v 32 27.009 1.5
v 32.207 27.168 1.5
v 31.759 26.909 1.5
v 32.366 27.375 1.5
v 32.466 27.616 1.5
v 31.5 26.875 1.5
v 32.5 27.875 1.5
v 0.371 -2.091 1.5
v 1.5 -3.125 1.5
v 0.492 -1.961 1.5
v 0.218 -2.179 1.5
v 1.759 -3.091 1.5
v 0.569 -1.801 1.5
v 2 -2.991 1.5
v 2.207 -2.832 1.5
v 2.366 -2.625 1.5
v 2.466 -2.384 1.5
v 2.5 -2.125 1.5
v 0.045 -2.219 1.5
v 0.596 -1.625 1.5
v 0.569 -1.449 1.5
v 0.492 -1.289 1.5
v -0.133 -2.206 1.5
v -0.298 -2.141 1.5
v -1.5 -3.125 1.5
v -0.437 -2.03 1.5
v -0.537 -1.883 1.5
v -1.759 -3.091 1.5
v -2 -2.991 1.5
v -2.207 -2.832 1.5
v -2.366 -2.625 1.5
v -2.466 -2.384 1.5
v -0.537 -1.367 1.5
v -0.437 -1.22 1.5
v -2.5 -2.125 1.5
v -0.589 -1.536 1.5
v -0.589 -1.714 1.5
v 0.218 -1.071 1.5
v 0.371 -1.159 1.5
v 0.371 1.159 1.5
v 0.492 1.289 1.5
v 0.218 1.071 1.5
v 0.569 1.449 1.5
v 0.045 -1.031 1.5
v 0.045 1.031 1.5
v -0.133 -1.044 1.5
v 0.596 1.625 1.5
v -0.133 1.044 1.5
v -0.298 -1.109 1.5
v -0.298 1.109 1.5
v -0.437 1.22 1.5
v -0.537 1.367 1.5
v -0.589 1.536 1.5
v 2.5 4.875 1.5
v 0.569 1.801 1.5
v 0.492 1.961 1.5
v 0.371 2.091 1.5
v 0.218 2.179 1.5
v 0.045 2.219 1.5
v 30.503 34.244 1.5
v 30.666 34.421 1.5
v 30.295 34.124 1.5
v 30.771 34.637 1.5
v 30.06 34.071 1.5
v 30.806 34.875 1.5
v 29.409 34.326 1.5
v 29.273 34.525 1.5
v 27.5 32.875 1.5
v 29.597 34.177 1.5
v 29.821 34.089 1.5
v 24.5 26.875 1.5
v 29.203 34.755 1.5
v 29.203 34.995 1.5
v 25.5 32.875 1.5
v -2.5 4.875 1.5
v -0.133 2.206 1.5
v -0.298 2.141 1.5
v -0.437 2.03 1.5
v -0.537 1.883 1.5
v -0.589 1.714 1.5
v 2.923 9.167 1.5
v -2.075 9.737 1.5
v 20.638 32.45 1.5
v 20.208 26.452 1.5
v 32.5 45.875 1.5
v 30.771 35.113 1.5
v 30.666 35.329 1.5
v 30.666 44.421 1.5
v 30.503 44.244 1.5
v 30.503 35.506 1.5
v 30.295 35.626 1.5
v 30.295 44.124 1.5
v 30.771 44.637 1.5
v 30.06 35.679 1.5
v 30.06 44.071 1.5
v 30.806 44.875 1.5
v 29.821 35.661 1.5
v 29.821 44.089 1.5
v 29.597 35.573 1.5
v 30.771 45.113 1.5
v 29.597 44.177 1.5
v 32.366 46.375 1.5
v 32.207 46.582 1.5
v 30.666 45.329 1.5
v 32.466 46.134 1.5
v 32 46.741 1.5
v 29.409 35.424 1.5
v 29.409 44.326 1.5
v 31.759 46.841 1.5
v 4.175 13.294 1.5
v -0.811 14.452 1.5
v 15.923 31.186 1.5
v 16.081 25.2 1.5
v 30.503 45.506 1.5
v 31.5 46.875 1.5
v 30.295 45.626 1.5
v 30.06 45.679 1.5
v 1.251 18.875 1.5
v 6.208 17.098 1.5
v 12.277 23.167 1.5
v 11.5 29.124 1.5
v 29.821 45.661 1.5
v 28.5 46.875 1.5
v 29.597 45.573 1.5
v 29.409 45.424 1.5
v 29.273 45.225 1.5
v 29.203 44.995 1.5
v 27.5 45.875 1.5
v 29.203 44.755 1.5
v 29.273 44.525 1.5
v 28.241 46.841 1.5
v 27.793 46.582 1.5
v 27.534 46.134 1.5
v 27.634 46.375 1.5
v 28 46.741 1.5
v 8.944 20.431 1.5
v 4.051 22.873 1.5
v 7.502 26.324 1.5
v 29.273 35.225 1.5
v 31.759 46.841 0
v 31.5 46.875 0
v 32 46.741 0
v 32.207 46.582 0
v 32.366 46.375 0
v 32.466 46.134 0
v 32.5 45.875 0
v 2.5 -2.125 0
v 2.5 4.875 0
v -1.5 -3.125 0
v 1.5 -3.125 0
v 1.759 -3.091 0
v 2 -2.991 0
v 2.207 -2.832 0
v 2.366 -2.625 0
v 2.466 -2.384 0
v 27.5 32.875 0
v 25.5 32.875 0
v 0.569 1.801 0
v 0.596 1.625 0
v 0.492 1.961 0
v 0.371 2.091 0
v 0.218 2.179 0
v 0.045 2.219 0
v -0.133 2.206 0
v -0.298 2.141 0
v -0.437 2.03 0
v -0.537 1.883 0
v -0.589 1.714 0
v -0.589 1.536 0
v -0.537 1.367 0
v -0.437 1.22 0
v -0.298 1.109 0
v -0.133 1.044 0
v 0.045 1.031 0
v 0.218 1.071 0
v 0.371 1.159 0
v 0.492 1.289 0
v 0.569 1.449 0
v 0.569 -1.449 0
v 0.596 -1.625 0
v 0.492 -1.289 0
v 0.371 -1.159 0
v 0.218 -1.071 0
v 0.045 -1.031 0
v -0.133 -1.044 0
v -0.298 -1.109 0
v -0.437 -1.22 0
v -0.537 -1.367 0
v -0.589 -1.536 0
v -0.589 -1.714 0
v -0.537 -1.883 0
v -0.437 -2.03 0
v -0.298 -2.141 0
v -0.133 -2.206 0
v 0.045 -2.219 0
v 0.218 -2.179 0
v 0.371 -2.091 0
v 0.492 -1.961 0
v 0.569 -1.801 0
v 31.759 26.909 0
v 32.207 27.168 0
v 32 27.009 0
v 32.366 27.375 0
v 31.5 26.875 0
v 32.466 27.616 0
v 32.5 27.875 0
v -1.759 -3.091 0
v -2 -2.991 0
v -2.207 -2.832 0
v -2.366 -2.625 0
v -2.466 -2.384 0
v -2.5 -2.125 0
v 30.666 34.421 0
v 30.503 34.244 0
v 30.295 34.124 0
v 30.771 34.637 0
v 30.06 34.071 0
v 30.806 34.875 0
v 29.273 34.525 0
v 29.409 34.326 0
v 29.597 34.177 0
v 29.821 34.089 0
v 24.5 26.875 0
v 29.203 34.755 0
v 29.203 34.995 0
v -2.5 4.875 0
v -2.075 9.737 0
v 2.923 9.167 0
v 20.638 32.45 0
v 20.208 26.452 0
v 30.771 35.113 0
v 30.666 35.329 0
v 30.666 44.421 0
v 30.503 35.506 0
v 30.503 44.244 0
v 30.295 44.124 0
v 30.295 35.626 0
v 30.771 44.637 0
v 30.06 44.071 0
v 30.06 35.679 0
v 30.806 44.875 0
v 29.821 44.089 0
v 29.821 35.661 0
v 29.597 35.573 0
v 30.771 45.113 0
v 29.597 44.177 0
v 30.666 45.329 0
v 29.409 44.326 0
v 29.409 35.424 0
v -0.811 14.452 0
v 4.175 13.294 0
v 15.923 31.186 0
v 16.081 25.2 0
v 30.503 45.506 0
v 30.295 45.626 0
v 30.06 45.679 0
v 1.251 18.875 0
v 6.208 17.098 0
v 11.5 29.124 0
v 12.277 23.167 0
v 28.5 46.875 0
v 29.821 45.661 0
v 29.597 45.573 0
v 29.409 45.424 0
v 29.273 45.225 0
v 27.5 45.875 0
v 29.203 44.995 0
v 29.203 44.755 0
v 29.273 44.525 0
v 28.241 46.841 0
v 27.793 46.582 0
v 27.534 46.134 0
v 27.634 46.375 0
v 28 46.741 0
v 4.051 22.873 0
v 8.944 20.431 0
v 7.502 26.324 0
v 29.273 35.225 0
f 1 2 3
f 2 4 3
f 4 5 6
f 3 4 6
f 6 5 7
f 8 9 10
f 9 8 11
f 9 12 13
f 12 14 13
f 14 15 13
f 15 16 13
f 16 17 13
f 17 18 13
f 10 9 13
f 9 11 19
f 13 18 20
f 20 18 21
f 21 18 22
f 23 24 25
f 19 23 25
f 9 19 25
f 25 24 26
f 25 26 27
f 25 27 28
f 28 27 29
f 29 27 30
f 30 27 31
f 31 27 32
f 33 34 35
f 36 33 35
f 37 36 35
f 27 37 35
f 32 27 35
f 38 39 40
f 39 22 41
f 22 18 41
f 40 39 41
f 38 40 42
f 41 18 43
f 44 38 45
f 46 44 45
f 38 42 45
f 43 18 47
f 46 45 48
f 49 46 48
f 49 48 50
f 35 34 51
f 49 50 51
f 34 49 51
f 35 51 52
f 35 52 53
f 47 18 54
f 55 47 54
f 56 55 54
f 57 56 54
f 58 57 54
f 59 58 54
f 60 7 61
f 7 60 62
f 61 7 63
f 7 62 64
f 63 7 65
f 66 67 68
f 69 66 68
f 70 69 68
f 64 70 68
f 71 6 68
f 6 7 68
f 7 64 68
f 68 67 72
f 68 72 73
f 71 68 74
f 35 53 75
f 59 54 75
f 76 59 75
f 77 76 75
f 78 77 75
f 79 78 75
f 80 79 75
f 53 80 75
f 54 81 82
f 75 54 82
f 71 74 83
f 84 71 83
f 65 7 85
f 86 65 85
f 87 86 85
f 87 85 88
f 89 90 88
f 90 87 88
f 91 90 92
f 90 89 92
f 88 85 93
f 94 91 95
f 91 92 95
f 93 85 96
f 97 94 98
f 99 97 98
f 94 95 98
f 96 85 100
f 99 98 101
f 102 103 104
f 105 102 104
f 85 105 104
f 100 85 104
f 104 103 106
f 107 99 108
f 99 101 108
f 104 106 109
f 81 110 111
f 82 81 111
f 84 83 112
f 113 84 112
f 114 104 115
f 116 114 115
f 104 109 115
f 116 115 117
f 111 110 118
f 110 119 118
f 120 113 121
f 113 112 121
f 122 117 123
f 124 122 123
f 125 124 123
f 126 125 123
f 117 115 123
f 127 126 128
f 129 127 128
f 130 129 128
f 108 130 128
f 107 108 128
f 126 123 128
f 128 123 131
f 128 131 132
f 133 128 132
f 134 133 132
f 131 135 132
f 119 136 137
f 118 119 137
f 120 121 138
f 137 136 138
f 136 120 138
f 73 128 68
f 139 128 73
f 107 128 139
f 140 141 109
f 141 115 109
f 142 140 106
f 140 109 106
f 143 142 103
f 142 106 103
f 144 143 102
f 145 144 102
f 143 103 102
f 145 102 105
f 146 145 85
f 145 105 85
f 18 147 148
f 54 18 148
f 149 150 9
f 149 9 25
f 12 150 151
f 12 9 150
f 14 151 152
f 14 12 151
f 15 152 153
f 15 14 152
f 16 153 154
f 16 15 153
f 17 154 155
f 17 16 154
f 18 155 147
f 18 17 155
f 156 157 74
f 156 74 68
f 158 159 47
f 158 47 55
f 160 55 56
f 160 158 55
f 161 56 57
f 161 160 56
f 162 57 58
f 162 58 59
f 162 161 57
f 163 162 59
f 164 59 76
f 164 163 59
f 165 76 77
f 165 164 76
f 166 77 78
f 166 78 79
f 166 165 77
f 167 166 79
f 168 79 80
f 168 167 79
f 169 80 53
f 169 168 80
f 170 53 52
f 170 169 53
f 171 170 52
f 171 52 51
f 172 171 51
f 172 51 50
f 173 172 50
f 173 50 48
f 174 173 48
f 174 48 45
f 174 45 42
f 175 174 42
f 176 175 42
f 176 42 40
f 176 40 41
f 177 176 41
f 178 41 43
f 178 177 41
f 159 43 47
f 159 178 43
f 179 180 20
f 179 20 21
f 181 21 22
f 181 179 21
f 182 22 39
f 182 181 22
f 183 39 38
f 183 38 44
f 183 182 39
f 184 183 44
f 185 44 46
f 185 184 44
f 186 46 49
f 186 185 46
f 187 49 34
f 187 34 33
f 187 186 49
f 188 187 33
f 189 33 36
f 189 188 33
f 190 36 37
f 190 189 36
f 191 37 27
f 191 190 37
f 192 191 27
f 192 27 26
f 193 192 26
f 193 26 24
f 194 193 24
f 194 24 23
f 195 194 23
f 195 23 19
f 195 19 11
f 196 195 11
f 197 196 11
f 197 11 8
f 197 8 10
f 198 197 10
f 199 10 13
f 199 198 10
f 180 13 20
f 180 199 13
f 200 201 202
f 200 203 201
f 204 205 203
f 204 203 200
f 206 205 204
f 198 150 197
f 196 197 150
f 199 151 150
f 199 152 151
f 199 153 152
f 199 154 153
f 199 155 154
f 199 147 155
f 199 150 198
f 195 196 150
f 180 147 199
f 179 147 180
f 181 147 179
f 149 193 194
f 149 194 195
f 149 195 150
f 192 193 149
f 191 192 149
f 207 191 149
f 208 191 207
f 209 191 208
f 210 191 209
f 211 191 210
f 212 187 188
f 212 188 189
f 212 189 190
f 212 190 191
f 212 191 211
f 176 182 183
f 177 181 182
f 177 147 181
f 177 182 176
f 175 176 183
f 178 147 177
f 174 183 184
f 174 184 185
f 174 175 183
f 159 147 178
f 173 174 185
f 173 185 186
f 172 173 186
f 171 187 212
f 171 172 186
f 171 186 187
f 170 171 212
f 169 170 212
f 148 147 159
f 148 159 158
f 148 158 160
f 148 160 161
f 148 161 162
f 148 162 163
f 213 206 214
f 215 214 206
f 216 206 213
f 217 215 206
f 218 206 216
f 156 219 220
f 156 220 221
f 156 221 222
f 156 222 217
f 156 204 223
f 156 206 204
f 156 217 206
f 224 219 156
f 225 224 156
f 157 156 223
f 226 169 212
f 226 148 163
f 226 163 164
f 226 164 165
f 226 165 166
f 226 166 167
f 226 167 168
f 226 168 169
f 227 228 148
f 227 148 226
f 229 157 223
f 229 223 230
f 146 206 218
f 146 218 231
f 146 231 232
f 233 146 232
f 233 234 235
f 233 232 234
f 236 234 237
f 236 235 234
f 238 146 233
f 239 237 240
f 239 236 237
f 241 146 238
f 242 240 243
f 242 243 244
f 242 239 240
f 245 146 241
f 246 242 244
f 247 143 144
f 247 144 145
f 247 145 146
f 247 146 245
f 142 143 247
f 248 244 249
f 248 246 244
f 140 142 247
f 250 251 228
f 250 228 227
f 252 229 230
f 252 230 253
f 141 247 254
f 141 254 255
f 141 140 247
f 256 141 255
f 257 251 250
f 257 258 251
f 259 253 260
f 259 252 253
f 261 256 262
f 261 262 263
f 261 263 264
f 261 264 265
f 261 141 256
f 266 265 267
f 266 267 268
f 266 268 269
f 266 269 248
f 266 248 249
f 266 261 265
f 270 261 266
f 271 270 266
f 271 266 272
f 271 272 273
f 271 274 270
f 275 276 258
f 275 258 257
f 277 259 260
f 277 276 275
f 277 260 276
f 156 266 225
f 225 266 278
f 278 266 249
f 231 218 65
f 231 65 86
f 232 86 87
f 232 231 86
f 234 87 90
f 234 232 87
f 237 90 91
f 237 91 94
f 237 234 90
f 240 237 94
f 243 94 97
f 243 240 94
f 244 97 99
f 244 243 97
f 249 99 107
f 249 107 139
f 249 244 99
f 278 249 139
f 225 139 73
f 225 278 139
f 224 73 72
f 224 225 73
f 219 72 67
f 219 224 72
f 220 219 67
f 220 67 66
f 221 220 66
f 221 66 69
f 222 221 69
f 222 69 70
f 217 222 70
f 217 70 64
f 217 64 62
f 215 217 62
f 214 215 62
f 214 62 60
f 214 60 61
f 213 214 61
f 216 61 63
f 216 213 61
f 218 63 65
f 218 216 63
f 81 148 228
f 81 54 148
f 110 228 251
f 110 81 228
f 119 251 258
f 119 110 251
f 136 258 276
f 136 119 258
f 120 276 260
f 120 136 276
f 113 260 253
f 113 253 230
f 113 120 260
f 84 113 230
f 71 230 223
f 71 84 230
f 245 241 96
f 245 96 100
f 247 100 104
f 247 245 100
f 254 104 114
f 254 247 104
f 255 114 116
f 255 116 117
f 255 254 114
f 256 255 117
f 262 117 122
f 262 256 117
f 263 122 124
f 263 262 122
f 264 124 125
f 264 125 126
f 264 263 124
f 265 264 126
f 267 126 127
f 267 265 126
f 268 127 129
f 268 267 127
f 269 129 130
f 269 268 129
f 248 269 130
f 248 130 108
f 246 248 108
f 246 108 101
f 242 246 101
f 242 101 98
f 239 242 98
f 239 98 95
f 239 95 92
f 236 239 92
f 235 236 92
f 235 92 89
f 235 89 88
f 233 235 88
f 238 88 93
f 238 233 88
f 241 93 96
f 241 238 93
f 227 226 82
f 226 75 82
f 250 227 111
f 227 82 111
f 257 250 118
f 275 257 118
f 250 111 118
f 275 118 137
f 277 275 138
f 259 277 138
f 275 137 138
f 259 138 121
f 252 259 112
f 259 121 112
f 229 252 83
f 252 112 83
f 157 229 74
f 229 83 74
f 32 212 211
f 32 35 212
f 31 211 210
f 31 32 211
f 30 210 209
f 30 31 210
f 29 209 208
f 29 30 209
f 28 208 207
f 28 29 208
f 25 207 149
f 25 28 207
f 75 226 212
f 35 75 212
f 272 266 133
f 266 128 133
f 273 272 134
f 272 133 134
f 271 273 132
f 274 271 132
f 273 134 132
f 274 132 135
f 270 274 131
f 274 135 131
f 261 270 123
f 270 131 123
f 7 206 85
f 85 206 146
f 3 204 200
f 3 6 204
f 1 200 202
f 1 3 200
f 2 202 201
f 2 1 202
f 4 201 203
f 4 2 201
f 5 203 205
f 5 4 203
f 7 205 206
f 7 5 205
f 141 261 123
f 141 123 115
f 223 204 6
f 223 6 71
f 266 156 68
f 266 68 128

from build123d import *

# Parameters (mm, degrees)
SKETCH1_R           = 0.59563
SKETCH1_R_2         = 0.80645
BOSS_EXTRUDE1_DEPTH = 1.5
FILLET2_R           = 22
FILLET3_R           = 28
FILLET1_R           = 1


with BuildPart() as part:
    # Sketch1 → Boss-Extrude1 (new body)
    with BuildSketch(Plane.XY):
        Polygon((-2.5, -3.125), (-2.5, 3.875), (-2.5, 32.875), (27.5, 32.875), (27.5, 46.875), (32.5, 46.875), (32.5, 32.875), (32.5, 26.875), (2.5, 26.875), (2.5, 3.875), (2.5, -3.125), align=None)
        with Locations((0, 1.625)):
            Circle(SKETCH1_R, mode=Mode.SUBTRACT)
        with Locations((0, -1.625)):
            Circle(SKETCH1_R, mode=Mode.SUBTRACT)
        with Locations((30, 44.875)):
            Circle(SKETCH1_R_2, mode=Mode.SUBTRACT)
        with Locations((30, 34.875)):
            Circle(SKETCH1_R_2, mode=Mode.SUBTRACT)
    extrude(amount=BOSS_EXTRUDE1_DEPTH)

    # Fillet2
    fillet2_edges = [part.edges().sort_by_distance(p)[0] for p in [
        (2.5, 26.875, 0.75),
    ]]
    fillet(fillet2_edges, radius=FILLET2_R)

    # Fillet3
    fillet3_edges = [part.edges().sort_by_distance(p)[0] for p in [
        (-2.5, 32.875, 0.75),
    ]]
    fillet(fillet3_edges, radius=FILLET3_R)

    # Fillet1
    fillet1_edges = [part.edges().sort_by_distance(p)[0] for p in [
        (2.5, -3.125, 0.75),
        (-2.5, -3.125, 0.75),
        (27.5, 46.875, 0.75),
        (32.5, 46.875, 0.75),
        (32.5, 26.875, 0.75),
    ]]
    fillet(fillet1_edges, radius=FILLET1_R)


solid = part.part
